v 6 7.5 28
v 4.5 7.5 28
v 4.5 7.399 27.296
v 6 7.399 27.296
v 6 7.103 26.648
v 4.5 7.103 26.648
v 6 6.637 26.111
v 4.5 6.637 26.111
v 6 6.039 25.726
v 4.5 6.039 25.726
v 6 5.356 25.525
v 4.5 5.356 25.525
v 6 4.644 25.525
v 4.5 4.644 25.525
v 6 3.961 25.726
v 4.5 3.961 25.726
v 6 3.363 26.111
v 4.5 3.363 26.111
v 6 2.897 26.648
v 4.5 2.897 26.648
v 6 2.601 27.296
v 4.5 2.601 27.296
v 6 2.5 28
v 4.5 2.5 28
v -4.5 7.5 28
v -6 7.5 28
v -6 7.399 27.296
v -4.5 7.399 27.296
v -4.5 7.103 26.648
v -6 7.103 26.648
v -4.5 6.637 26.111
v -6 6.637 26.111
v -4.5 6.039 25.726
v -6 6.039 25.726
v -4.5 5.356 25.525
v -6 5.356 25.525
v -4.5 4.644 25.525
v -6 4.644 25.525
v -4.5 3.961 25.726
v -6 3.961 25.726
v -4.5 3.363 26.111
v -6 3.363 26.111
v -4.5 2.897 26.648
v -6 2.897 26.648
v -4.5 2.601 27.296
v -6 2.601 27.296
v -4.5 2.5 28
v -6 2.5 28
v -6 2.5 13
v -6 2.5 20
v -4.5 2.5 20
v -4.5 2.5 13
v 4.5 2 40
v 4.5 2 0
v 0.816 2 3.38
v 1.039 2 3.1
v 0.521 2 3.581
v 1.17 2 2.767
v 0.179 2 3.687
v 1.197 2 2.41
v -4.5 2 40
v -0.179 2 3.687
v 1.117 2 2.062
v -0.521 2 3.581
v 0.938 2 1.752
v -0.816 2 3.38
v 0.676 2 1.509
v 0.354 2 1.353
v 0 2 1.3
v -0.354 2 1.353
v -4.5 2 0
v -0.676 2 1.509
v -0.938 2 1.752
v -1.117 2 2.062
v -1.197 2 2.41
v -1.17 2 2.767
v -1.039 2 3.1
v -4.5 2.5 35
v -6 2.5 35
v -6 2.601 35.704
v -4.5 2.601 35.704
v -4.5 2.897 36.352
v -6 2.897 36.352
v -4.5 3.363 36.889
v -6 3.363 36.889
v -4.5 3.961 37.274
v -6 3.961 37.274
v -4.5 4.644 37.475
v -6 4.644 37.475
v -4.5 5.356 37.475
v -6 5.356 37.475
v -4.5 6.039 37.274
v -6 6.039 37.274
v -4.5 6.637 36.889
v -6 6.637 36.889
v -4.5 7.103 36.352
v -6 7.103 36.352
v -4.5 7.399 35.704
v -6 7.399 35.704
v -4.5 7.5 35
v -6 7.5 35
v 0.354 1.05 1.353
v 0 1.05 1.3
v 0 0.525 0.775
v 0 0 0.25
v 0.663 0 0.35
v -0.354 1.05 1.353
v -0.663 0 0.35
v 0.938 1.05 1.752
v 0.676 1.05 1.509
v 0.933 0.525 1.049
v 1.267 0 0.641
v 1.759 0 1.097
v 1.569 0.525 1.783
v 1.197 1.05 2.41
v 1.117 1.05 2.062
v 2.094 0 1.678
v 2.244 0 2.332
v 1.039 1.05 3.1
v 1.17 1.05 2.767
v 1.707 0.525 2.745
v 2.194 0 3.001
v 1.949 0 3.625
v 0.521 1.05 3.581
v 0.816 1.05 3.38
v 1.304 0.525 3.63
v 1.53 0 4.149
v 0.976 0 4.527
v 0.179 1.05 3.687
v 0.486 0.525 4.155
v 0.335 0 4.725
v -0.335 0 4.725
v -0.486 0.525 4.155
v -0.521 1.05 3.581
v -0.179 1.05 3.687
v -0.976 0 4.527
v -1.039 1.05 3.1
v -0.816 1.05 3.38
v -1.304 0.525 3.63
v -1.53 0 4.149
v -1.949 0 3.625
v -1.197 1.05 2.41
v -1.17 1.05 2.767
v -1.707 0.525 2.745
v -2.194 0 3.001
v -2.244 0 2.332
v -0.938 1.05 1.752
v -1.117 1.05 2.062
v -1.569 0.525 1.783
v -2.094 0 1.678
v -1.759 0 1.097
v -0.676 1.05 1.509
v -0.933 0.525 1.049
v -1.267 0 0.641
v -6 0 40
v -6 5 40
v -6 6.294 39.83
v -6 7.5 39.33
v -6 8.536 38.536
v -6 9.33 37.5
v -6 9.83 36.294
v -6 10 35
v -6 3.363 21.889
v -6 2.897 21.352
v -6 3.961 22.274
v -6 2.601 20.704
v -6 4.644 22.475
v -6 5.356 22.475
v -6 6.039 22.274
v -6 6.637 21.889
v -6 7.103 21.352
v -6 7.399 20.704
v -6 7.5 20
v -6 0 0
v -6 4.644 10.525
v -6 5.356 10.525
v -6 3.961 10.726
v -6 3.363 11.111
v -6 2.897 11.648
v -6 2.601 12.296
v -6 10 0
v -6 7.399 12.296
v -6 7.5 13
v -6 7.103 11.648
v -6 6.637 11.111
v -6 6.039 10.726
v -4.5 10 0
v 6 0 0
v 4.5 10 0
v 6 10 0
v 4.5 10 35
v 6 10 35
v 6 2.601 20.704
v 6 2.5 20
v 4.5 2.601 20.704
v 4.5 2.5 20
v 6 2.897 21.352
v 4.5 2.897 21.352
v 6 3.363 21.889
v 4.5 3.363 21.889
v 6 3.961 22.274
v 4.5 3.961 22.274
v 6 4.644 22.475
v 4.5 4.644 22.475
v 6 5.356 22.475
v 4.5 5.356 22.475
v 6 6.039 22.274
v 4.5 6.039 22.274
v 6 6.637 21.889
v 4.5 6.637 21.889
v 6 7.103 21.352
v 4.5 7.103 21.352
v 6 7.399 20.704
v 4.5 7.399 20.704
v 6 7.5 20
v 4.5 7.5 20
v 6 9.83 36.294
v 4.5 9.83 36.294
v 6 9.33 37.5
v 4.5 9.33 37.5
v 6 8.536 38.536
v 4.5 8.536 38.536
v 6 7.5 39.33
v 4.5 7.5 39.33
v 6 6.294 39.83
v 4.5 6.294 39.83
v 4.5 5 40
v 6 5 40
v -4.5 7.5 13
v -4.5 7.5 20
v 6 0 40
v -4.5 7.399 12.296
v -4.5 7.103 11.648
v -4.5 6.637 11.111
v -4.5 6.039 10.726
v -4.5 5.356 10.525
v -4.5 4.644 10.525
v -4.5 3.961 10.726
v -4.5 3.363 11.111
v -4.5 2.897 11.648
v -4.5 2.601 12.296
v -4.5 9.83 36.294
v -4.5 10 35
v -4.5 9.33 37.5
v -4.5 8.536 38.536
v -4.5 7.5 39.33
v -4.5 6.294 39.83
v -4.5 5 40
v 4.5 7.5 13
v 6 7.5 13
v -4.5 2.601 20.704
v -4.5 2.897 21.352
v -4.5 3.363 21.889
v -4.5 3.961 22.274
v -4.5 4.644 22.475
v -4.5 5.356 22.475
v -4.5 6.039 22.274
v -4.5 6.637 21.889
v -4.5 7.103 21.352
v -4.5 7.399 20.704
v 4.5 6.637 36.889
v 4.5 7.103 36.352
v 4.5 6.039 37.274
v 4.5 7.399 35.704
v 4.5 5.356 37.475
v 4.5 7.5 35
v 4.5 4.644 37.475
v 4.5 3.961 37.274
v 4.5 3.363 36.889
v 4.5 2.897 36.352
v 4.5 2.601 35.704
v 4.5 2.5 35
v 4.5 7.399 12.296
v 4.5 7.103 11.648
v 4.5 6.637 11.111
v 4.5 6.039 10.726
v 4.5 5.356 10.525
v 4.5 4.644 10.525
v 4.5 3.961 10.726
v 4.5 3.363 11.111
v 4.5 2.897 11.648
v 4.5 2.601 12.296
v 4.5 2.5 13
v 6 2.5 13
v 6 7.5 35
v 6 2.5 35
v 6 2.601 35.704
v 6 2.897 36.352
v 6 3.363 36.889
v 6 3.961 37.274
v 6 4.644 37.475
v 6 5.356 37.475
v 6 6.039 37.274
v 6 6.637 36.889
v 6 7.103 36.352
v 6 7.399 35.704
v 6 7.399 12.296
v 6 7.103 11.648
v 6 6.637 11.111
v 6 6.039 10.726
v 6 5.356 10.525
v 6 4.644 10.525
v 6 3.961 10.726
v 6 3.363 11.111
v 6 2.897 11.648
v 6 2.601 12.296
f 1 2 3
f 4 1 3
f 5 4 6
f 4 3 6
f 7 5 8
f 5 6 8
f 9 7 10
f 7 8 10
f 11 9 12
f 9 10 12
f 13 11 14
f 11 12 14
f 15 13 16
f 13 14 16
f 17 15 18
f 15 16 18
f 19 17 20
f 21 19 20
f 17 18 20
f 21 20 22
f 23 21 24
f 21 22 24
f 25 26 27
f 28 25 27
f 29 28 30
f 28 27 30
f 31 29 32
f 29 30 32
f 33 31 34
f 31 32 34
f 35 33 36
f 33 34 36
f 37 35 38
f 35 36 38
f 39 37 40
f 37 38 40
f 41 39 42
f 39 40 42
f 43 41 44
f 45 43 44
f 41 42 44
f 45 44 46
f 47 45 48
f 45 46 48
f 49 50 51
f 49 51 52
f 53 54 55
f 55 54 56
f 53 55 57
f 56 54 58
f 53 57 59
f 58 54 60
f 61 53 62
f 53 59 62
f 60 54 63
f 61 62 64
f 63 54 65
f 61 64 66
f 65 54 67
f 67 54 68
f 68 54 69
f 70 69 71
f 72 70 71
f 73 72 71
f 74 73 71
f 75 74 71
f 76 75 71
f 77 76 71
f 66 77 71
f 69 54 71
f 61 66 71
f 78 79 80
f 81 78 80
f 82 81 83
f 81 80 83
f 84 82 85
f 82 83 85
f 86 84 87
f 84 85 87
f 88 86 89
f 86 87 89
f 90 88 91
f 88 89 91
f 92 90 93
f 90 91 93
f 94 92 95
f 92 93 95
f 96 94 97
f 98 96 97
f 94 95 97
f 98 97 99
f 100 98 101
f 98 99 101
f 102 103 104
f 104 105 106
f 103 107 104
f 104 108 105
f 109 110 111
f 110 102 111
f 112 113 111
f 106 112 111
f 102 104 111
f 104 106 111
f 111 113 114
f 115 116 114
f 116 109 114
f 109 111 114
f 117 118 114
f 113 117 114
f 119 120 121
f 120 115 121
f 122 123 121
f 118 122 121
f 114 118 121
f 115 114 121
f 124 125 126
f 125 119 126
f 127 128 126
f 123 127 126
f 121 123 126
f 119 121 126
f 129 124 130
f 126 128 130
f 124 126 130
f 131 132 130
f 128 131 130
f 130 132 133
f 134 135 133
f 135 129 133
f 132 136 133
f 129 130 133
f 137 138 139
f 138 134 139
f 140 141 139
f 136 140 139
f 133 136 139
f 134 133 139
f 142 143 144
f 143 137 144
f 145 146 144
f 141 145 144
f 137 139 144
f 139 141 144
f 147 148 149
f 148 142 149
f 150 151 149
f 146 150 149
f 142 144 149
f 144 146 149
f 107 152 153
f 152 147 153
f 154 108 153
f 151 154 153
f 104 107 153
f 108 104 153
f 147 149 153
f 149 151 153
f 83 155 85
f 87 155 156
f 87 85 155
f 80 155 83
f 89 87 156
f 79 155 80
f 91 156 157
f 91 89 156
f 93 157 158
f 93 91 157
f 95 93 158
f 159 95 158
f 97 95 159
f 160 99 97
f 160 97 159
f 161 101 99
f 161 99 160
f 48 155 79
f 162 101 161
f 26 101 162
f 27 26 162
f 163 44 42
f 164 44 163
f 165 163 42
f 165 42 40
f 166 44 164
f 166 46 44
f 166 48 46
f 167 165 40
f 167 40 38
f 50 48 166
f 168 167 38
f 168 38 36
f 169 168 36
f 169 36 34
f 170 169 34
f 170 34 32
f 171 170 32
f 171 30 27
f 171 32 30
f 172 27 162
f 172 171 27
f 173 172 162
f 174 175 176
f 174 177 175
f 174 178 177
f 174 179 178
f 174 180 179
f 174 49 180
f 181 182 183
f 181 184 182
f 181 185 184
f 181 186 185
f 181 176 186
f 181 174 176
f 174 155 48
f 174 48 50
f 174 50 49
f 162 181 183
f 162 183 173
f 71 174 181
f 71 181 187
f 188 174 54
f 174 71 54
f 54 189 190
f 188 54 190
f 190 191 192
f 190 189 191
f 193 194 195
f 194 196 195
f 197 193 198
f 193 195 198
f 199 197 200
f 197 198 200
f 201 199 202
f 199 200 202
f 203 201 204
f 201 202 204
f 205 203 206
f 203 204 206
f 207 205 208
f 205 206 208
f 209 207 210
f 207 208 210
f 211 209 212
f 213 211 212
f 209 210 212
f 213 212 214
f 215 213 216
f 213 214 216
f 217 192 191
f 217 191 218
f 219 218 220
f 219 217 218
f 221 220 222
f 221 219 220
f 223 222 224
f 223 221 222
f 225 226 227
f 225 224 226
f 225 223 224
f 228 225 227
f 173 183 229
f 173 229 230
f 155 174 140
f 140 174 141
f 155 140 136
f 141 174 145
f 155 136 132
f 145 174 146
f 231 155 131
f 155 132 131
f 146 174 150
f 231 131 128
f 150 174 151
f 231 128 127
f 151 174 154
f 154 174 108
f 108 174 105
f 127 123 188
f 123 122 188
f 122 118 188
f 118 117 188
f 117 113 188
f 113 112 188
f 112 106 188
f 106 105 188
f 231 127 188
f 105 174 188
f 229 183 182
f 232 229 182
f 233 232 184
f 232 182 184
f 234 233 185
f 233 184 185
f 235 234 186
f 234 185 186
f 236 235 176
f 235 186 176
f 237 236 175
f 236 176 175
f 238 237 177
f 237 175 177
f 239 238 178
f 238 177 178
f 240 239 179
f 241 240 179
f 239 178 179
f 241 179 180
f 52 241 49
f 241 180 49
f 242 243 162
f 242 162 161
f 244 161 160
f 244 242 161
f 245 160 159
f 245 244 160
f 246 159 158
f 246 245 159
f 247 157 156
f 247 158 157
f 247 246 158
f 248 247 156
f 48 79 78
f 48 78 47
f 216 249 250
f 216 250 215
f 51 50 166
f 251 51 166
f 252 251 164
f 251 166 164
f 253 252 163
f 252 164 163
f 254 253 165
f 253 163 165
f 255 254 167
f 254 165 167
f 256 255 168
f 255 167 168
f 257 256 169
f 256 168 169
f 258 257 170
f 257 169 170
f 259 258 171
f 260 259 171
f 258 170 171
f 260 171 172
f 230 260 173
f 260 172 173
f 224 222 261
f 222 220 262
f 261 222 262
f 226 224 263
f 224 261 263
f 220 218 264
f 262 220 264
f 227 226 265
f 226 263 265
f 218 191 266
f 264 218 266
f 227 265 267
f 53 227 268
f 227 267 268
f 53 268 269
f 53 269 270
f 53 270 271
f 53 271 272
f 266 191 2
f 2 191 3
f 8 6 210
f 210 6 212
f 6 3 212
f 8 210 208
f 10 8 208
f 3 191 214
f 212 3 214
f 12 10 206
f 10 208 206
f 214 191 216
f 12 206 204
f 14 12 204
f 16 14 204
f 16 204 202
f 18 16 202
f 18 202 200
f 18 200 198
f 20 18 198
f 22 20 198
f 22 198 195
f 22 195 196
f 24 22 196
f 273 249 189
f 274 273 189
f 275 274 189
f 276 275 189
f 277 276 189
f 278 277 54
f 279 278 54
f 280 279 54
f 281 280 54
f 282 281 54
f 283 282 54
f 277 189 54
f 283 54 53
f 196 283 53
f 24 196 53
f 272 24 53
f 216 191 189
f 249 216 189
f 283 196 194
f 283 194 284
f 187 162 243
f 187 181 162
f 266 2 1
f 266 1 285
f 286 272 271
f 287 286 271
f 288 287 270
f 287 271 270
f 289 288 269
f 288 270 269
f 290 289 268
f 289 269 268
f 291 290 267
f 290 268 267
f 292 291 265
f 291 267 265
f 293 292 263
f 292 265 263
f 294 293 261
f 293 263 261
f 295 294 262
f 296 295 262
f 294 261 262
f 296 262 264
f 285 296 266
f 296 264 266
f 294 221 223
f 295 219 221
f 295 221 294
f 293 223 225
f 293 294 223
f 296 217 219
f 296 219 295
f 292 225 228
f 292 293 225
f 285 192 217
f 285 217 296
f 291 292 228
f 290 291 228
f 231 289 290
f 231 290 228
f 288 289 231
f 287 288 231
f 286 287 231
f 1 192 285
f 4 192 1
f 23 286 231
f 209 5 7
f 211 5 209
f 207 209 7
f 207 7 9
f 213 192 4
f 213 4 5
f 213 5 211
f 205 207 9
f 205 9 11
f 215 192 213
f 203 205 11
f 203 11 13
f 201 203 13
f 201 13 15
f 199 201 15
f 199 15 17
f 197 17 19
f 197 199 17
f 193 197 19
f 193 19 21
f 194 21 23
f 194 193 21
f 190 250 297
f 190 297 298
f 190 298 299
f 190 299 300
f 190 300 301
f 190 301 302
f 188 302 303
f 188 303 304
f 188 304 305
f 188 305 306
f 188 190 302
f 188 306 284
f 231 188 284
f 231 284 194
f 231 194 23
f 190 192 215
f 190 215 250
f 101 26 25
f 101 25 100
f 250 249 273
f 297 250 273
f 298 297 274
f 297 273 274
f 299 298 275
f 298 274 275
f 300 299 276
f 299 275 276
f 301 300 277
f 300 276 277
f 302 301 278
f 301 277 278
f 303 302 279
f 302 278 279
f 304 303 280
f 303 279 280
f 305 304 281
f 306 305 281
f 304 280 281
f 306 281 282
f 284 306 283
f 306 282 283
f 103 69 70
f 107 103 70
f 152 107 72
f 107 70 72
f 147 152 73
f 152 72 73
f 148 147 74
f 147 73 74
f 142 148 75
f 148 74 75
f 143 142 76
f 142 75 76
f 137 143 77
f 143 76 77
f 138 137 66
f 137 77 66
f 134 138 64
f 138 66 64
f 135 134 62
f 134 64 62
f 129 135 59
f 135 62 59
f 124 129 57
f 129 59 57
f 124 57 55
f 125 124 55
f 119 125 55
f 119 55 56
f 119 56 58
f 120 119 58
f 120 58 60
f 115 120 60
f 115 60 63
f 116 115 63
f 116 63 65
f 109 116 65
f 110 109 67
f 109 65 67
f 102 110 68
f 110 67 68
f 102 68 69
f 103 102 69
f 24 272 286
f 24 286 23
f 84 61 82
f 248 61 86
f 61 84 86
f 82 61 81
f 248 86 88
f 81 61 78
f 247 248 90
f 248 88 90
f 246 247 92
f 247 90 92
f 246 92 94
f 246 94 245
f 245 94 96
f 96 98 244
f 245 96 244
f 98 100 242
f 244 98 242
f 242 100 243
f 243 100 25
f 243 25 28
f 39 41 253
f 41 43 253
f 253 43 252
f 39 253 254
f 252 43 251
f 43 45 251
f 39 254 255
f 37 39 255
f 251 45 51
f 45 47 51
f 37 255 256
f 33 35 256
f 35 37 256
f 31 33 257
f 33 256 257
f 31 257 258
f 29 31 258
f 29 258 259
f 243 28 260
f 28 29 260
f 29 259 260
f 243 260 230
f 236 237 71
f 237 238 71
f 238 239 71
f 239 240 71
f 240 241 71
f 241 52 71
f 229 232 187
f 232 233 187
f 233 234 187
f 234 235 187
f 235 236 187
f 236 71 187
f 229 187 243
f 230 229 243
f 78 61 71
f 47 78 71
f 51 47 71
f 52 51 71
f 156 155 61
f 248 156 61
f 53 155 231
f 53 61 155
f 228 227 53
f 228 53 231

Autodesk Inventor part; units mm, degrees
ref_plane "YZ Plane" through (0, 0, 0) normal (1, 0, 0) x (0, 1, 0)
ref_plane "XZ Plane" through (0, 0, 0) normal (0, 1, 0) x (-1, 0, 0)
ref_plane "XY Plane" through (0, 0, 0) normal (0, 0, 1) x (1, 0, 0)
sketch "Skizze1" plane through (0, 0, 0) normal (0, 0, 1) x (1, 0, 0)
  line L0 (-8.4, 0) -> (8.4, 0) projected
  line L1 (0, -2) -> (0, 12) projected
  line L2 (6, 10) -> (6, 0)
  line L3 (6, 0) -> (-6, 0)
  line L4 (-6, 0) -> (-6, 10)
  line L5 (4.5, 10) -> (4.5, 2)
  line L6 (4.5, 2) -> (-4.5, 2)
  line L7 (-4.5, 2) -> (-4.5, 10)
  line L8 (-6, 10) -> (-4.5, 10)
  line L9 (4.5, 10) -> (6, 10)
  point P0 (0, 0)
  dimension "d0" = 2
  dimension "d2" = 9
  dimension "d3" = 1.5
  dimension "d4" = 10
extrude "Extrusion1" add sketch "Skizze1" along normal blind 40
sketch "Skizze2" plane through (-6, 0, 0) normal (0, -1, 0) x (1, 0, 0)
  line L0 (0, 0) -> (12, 0) projected
  line L1 (12, 0) -> (12, 40) projected
  point P0 (6, 0)
  point P1 (6, 2.5)
  dimension "d7" = 2.5
  dimension "d8" = 6
hole "Bohrung1" at (0, 0, 2.5) direction (0, 1, 0) diameter 2.4 end through all countersink diameter 4.5 countersink angle 90
sketch "Skizze3" plane through (-6, 0, 0) normal (-1, 0, 0) x (0, 0, 1)
  line L0 (0, 0) -> (40, 0) projected
  line L1 (40, 10) -> (40, 0) projected
  line L2 (35, 5) -> (28, 5) construction
  line L3 (35, 2.5) -> (28, 2.5)
  line L4 (28, 7.5) -> (35, 7.5)
  arc A0 (35, 2.5) -> (35, 7.5) centre (35, 5) ccw
  arc A1 (28, 7.5) -> (28, 2.5) centre (28, 5) ccw
  point P0 (31.5, 5)
  dimension "d16" = 5
  dimension "d17" = 5
  dimension "d18" = 5
  dimension "d19" = 7
extrude "Extrusion2" cut sketch "Skizze3" against normal through all
pattern_linear "Rechteckige Anordnung1" count 2 spacing 15 along (0, 0, -1) of "Extrusion2"
fillet "Rundung1" radius 5 2 edges at (5.25, 10, 40) (-5.25, 10, 40)
properties part number "13_1087_001" material "Kupfer"
